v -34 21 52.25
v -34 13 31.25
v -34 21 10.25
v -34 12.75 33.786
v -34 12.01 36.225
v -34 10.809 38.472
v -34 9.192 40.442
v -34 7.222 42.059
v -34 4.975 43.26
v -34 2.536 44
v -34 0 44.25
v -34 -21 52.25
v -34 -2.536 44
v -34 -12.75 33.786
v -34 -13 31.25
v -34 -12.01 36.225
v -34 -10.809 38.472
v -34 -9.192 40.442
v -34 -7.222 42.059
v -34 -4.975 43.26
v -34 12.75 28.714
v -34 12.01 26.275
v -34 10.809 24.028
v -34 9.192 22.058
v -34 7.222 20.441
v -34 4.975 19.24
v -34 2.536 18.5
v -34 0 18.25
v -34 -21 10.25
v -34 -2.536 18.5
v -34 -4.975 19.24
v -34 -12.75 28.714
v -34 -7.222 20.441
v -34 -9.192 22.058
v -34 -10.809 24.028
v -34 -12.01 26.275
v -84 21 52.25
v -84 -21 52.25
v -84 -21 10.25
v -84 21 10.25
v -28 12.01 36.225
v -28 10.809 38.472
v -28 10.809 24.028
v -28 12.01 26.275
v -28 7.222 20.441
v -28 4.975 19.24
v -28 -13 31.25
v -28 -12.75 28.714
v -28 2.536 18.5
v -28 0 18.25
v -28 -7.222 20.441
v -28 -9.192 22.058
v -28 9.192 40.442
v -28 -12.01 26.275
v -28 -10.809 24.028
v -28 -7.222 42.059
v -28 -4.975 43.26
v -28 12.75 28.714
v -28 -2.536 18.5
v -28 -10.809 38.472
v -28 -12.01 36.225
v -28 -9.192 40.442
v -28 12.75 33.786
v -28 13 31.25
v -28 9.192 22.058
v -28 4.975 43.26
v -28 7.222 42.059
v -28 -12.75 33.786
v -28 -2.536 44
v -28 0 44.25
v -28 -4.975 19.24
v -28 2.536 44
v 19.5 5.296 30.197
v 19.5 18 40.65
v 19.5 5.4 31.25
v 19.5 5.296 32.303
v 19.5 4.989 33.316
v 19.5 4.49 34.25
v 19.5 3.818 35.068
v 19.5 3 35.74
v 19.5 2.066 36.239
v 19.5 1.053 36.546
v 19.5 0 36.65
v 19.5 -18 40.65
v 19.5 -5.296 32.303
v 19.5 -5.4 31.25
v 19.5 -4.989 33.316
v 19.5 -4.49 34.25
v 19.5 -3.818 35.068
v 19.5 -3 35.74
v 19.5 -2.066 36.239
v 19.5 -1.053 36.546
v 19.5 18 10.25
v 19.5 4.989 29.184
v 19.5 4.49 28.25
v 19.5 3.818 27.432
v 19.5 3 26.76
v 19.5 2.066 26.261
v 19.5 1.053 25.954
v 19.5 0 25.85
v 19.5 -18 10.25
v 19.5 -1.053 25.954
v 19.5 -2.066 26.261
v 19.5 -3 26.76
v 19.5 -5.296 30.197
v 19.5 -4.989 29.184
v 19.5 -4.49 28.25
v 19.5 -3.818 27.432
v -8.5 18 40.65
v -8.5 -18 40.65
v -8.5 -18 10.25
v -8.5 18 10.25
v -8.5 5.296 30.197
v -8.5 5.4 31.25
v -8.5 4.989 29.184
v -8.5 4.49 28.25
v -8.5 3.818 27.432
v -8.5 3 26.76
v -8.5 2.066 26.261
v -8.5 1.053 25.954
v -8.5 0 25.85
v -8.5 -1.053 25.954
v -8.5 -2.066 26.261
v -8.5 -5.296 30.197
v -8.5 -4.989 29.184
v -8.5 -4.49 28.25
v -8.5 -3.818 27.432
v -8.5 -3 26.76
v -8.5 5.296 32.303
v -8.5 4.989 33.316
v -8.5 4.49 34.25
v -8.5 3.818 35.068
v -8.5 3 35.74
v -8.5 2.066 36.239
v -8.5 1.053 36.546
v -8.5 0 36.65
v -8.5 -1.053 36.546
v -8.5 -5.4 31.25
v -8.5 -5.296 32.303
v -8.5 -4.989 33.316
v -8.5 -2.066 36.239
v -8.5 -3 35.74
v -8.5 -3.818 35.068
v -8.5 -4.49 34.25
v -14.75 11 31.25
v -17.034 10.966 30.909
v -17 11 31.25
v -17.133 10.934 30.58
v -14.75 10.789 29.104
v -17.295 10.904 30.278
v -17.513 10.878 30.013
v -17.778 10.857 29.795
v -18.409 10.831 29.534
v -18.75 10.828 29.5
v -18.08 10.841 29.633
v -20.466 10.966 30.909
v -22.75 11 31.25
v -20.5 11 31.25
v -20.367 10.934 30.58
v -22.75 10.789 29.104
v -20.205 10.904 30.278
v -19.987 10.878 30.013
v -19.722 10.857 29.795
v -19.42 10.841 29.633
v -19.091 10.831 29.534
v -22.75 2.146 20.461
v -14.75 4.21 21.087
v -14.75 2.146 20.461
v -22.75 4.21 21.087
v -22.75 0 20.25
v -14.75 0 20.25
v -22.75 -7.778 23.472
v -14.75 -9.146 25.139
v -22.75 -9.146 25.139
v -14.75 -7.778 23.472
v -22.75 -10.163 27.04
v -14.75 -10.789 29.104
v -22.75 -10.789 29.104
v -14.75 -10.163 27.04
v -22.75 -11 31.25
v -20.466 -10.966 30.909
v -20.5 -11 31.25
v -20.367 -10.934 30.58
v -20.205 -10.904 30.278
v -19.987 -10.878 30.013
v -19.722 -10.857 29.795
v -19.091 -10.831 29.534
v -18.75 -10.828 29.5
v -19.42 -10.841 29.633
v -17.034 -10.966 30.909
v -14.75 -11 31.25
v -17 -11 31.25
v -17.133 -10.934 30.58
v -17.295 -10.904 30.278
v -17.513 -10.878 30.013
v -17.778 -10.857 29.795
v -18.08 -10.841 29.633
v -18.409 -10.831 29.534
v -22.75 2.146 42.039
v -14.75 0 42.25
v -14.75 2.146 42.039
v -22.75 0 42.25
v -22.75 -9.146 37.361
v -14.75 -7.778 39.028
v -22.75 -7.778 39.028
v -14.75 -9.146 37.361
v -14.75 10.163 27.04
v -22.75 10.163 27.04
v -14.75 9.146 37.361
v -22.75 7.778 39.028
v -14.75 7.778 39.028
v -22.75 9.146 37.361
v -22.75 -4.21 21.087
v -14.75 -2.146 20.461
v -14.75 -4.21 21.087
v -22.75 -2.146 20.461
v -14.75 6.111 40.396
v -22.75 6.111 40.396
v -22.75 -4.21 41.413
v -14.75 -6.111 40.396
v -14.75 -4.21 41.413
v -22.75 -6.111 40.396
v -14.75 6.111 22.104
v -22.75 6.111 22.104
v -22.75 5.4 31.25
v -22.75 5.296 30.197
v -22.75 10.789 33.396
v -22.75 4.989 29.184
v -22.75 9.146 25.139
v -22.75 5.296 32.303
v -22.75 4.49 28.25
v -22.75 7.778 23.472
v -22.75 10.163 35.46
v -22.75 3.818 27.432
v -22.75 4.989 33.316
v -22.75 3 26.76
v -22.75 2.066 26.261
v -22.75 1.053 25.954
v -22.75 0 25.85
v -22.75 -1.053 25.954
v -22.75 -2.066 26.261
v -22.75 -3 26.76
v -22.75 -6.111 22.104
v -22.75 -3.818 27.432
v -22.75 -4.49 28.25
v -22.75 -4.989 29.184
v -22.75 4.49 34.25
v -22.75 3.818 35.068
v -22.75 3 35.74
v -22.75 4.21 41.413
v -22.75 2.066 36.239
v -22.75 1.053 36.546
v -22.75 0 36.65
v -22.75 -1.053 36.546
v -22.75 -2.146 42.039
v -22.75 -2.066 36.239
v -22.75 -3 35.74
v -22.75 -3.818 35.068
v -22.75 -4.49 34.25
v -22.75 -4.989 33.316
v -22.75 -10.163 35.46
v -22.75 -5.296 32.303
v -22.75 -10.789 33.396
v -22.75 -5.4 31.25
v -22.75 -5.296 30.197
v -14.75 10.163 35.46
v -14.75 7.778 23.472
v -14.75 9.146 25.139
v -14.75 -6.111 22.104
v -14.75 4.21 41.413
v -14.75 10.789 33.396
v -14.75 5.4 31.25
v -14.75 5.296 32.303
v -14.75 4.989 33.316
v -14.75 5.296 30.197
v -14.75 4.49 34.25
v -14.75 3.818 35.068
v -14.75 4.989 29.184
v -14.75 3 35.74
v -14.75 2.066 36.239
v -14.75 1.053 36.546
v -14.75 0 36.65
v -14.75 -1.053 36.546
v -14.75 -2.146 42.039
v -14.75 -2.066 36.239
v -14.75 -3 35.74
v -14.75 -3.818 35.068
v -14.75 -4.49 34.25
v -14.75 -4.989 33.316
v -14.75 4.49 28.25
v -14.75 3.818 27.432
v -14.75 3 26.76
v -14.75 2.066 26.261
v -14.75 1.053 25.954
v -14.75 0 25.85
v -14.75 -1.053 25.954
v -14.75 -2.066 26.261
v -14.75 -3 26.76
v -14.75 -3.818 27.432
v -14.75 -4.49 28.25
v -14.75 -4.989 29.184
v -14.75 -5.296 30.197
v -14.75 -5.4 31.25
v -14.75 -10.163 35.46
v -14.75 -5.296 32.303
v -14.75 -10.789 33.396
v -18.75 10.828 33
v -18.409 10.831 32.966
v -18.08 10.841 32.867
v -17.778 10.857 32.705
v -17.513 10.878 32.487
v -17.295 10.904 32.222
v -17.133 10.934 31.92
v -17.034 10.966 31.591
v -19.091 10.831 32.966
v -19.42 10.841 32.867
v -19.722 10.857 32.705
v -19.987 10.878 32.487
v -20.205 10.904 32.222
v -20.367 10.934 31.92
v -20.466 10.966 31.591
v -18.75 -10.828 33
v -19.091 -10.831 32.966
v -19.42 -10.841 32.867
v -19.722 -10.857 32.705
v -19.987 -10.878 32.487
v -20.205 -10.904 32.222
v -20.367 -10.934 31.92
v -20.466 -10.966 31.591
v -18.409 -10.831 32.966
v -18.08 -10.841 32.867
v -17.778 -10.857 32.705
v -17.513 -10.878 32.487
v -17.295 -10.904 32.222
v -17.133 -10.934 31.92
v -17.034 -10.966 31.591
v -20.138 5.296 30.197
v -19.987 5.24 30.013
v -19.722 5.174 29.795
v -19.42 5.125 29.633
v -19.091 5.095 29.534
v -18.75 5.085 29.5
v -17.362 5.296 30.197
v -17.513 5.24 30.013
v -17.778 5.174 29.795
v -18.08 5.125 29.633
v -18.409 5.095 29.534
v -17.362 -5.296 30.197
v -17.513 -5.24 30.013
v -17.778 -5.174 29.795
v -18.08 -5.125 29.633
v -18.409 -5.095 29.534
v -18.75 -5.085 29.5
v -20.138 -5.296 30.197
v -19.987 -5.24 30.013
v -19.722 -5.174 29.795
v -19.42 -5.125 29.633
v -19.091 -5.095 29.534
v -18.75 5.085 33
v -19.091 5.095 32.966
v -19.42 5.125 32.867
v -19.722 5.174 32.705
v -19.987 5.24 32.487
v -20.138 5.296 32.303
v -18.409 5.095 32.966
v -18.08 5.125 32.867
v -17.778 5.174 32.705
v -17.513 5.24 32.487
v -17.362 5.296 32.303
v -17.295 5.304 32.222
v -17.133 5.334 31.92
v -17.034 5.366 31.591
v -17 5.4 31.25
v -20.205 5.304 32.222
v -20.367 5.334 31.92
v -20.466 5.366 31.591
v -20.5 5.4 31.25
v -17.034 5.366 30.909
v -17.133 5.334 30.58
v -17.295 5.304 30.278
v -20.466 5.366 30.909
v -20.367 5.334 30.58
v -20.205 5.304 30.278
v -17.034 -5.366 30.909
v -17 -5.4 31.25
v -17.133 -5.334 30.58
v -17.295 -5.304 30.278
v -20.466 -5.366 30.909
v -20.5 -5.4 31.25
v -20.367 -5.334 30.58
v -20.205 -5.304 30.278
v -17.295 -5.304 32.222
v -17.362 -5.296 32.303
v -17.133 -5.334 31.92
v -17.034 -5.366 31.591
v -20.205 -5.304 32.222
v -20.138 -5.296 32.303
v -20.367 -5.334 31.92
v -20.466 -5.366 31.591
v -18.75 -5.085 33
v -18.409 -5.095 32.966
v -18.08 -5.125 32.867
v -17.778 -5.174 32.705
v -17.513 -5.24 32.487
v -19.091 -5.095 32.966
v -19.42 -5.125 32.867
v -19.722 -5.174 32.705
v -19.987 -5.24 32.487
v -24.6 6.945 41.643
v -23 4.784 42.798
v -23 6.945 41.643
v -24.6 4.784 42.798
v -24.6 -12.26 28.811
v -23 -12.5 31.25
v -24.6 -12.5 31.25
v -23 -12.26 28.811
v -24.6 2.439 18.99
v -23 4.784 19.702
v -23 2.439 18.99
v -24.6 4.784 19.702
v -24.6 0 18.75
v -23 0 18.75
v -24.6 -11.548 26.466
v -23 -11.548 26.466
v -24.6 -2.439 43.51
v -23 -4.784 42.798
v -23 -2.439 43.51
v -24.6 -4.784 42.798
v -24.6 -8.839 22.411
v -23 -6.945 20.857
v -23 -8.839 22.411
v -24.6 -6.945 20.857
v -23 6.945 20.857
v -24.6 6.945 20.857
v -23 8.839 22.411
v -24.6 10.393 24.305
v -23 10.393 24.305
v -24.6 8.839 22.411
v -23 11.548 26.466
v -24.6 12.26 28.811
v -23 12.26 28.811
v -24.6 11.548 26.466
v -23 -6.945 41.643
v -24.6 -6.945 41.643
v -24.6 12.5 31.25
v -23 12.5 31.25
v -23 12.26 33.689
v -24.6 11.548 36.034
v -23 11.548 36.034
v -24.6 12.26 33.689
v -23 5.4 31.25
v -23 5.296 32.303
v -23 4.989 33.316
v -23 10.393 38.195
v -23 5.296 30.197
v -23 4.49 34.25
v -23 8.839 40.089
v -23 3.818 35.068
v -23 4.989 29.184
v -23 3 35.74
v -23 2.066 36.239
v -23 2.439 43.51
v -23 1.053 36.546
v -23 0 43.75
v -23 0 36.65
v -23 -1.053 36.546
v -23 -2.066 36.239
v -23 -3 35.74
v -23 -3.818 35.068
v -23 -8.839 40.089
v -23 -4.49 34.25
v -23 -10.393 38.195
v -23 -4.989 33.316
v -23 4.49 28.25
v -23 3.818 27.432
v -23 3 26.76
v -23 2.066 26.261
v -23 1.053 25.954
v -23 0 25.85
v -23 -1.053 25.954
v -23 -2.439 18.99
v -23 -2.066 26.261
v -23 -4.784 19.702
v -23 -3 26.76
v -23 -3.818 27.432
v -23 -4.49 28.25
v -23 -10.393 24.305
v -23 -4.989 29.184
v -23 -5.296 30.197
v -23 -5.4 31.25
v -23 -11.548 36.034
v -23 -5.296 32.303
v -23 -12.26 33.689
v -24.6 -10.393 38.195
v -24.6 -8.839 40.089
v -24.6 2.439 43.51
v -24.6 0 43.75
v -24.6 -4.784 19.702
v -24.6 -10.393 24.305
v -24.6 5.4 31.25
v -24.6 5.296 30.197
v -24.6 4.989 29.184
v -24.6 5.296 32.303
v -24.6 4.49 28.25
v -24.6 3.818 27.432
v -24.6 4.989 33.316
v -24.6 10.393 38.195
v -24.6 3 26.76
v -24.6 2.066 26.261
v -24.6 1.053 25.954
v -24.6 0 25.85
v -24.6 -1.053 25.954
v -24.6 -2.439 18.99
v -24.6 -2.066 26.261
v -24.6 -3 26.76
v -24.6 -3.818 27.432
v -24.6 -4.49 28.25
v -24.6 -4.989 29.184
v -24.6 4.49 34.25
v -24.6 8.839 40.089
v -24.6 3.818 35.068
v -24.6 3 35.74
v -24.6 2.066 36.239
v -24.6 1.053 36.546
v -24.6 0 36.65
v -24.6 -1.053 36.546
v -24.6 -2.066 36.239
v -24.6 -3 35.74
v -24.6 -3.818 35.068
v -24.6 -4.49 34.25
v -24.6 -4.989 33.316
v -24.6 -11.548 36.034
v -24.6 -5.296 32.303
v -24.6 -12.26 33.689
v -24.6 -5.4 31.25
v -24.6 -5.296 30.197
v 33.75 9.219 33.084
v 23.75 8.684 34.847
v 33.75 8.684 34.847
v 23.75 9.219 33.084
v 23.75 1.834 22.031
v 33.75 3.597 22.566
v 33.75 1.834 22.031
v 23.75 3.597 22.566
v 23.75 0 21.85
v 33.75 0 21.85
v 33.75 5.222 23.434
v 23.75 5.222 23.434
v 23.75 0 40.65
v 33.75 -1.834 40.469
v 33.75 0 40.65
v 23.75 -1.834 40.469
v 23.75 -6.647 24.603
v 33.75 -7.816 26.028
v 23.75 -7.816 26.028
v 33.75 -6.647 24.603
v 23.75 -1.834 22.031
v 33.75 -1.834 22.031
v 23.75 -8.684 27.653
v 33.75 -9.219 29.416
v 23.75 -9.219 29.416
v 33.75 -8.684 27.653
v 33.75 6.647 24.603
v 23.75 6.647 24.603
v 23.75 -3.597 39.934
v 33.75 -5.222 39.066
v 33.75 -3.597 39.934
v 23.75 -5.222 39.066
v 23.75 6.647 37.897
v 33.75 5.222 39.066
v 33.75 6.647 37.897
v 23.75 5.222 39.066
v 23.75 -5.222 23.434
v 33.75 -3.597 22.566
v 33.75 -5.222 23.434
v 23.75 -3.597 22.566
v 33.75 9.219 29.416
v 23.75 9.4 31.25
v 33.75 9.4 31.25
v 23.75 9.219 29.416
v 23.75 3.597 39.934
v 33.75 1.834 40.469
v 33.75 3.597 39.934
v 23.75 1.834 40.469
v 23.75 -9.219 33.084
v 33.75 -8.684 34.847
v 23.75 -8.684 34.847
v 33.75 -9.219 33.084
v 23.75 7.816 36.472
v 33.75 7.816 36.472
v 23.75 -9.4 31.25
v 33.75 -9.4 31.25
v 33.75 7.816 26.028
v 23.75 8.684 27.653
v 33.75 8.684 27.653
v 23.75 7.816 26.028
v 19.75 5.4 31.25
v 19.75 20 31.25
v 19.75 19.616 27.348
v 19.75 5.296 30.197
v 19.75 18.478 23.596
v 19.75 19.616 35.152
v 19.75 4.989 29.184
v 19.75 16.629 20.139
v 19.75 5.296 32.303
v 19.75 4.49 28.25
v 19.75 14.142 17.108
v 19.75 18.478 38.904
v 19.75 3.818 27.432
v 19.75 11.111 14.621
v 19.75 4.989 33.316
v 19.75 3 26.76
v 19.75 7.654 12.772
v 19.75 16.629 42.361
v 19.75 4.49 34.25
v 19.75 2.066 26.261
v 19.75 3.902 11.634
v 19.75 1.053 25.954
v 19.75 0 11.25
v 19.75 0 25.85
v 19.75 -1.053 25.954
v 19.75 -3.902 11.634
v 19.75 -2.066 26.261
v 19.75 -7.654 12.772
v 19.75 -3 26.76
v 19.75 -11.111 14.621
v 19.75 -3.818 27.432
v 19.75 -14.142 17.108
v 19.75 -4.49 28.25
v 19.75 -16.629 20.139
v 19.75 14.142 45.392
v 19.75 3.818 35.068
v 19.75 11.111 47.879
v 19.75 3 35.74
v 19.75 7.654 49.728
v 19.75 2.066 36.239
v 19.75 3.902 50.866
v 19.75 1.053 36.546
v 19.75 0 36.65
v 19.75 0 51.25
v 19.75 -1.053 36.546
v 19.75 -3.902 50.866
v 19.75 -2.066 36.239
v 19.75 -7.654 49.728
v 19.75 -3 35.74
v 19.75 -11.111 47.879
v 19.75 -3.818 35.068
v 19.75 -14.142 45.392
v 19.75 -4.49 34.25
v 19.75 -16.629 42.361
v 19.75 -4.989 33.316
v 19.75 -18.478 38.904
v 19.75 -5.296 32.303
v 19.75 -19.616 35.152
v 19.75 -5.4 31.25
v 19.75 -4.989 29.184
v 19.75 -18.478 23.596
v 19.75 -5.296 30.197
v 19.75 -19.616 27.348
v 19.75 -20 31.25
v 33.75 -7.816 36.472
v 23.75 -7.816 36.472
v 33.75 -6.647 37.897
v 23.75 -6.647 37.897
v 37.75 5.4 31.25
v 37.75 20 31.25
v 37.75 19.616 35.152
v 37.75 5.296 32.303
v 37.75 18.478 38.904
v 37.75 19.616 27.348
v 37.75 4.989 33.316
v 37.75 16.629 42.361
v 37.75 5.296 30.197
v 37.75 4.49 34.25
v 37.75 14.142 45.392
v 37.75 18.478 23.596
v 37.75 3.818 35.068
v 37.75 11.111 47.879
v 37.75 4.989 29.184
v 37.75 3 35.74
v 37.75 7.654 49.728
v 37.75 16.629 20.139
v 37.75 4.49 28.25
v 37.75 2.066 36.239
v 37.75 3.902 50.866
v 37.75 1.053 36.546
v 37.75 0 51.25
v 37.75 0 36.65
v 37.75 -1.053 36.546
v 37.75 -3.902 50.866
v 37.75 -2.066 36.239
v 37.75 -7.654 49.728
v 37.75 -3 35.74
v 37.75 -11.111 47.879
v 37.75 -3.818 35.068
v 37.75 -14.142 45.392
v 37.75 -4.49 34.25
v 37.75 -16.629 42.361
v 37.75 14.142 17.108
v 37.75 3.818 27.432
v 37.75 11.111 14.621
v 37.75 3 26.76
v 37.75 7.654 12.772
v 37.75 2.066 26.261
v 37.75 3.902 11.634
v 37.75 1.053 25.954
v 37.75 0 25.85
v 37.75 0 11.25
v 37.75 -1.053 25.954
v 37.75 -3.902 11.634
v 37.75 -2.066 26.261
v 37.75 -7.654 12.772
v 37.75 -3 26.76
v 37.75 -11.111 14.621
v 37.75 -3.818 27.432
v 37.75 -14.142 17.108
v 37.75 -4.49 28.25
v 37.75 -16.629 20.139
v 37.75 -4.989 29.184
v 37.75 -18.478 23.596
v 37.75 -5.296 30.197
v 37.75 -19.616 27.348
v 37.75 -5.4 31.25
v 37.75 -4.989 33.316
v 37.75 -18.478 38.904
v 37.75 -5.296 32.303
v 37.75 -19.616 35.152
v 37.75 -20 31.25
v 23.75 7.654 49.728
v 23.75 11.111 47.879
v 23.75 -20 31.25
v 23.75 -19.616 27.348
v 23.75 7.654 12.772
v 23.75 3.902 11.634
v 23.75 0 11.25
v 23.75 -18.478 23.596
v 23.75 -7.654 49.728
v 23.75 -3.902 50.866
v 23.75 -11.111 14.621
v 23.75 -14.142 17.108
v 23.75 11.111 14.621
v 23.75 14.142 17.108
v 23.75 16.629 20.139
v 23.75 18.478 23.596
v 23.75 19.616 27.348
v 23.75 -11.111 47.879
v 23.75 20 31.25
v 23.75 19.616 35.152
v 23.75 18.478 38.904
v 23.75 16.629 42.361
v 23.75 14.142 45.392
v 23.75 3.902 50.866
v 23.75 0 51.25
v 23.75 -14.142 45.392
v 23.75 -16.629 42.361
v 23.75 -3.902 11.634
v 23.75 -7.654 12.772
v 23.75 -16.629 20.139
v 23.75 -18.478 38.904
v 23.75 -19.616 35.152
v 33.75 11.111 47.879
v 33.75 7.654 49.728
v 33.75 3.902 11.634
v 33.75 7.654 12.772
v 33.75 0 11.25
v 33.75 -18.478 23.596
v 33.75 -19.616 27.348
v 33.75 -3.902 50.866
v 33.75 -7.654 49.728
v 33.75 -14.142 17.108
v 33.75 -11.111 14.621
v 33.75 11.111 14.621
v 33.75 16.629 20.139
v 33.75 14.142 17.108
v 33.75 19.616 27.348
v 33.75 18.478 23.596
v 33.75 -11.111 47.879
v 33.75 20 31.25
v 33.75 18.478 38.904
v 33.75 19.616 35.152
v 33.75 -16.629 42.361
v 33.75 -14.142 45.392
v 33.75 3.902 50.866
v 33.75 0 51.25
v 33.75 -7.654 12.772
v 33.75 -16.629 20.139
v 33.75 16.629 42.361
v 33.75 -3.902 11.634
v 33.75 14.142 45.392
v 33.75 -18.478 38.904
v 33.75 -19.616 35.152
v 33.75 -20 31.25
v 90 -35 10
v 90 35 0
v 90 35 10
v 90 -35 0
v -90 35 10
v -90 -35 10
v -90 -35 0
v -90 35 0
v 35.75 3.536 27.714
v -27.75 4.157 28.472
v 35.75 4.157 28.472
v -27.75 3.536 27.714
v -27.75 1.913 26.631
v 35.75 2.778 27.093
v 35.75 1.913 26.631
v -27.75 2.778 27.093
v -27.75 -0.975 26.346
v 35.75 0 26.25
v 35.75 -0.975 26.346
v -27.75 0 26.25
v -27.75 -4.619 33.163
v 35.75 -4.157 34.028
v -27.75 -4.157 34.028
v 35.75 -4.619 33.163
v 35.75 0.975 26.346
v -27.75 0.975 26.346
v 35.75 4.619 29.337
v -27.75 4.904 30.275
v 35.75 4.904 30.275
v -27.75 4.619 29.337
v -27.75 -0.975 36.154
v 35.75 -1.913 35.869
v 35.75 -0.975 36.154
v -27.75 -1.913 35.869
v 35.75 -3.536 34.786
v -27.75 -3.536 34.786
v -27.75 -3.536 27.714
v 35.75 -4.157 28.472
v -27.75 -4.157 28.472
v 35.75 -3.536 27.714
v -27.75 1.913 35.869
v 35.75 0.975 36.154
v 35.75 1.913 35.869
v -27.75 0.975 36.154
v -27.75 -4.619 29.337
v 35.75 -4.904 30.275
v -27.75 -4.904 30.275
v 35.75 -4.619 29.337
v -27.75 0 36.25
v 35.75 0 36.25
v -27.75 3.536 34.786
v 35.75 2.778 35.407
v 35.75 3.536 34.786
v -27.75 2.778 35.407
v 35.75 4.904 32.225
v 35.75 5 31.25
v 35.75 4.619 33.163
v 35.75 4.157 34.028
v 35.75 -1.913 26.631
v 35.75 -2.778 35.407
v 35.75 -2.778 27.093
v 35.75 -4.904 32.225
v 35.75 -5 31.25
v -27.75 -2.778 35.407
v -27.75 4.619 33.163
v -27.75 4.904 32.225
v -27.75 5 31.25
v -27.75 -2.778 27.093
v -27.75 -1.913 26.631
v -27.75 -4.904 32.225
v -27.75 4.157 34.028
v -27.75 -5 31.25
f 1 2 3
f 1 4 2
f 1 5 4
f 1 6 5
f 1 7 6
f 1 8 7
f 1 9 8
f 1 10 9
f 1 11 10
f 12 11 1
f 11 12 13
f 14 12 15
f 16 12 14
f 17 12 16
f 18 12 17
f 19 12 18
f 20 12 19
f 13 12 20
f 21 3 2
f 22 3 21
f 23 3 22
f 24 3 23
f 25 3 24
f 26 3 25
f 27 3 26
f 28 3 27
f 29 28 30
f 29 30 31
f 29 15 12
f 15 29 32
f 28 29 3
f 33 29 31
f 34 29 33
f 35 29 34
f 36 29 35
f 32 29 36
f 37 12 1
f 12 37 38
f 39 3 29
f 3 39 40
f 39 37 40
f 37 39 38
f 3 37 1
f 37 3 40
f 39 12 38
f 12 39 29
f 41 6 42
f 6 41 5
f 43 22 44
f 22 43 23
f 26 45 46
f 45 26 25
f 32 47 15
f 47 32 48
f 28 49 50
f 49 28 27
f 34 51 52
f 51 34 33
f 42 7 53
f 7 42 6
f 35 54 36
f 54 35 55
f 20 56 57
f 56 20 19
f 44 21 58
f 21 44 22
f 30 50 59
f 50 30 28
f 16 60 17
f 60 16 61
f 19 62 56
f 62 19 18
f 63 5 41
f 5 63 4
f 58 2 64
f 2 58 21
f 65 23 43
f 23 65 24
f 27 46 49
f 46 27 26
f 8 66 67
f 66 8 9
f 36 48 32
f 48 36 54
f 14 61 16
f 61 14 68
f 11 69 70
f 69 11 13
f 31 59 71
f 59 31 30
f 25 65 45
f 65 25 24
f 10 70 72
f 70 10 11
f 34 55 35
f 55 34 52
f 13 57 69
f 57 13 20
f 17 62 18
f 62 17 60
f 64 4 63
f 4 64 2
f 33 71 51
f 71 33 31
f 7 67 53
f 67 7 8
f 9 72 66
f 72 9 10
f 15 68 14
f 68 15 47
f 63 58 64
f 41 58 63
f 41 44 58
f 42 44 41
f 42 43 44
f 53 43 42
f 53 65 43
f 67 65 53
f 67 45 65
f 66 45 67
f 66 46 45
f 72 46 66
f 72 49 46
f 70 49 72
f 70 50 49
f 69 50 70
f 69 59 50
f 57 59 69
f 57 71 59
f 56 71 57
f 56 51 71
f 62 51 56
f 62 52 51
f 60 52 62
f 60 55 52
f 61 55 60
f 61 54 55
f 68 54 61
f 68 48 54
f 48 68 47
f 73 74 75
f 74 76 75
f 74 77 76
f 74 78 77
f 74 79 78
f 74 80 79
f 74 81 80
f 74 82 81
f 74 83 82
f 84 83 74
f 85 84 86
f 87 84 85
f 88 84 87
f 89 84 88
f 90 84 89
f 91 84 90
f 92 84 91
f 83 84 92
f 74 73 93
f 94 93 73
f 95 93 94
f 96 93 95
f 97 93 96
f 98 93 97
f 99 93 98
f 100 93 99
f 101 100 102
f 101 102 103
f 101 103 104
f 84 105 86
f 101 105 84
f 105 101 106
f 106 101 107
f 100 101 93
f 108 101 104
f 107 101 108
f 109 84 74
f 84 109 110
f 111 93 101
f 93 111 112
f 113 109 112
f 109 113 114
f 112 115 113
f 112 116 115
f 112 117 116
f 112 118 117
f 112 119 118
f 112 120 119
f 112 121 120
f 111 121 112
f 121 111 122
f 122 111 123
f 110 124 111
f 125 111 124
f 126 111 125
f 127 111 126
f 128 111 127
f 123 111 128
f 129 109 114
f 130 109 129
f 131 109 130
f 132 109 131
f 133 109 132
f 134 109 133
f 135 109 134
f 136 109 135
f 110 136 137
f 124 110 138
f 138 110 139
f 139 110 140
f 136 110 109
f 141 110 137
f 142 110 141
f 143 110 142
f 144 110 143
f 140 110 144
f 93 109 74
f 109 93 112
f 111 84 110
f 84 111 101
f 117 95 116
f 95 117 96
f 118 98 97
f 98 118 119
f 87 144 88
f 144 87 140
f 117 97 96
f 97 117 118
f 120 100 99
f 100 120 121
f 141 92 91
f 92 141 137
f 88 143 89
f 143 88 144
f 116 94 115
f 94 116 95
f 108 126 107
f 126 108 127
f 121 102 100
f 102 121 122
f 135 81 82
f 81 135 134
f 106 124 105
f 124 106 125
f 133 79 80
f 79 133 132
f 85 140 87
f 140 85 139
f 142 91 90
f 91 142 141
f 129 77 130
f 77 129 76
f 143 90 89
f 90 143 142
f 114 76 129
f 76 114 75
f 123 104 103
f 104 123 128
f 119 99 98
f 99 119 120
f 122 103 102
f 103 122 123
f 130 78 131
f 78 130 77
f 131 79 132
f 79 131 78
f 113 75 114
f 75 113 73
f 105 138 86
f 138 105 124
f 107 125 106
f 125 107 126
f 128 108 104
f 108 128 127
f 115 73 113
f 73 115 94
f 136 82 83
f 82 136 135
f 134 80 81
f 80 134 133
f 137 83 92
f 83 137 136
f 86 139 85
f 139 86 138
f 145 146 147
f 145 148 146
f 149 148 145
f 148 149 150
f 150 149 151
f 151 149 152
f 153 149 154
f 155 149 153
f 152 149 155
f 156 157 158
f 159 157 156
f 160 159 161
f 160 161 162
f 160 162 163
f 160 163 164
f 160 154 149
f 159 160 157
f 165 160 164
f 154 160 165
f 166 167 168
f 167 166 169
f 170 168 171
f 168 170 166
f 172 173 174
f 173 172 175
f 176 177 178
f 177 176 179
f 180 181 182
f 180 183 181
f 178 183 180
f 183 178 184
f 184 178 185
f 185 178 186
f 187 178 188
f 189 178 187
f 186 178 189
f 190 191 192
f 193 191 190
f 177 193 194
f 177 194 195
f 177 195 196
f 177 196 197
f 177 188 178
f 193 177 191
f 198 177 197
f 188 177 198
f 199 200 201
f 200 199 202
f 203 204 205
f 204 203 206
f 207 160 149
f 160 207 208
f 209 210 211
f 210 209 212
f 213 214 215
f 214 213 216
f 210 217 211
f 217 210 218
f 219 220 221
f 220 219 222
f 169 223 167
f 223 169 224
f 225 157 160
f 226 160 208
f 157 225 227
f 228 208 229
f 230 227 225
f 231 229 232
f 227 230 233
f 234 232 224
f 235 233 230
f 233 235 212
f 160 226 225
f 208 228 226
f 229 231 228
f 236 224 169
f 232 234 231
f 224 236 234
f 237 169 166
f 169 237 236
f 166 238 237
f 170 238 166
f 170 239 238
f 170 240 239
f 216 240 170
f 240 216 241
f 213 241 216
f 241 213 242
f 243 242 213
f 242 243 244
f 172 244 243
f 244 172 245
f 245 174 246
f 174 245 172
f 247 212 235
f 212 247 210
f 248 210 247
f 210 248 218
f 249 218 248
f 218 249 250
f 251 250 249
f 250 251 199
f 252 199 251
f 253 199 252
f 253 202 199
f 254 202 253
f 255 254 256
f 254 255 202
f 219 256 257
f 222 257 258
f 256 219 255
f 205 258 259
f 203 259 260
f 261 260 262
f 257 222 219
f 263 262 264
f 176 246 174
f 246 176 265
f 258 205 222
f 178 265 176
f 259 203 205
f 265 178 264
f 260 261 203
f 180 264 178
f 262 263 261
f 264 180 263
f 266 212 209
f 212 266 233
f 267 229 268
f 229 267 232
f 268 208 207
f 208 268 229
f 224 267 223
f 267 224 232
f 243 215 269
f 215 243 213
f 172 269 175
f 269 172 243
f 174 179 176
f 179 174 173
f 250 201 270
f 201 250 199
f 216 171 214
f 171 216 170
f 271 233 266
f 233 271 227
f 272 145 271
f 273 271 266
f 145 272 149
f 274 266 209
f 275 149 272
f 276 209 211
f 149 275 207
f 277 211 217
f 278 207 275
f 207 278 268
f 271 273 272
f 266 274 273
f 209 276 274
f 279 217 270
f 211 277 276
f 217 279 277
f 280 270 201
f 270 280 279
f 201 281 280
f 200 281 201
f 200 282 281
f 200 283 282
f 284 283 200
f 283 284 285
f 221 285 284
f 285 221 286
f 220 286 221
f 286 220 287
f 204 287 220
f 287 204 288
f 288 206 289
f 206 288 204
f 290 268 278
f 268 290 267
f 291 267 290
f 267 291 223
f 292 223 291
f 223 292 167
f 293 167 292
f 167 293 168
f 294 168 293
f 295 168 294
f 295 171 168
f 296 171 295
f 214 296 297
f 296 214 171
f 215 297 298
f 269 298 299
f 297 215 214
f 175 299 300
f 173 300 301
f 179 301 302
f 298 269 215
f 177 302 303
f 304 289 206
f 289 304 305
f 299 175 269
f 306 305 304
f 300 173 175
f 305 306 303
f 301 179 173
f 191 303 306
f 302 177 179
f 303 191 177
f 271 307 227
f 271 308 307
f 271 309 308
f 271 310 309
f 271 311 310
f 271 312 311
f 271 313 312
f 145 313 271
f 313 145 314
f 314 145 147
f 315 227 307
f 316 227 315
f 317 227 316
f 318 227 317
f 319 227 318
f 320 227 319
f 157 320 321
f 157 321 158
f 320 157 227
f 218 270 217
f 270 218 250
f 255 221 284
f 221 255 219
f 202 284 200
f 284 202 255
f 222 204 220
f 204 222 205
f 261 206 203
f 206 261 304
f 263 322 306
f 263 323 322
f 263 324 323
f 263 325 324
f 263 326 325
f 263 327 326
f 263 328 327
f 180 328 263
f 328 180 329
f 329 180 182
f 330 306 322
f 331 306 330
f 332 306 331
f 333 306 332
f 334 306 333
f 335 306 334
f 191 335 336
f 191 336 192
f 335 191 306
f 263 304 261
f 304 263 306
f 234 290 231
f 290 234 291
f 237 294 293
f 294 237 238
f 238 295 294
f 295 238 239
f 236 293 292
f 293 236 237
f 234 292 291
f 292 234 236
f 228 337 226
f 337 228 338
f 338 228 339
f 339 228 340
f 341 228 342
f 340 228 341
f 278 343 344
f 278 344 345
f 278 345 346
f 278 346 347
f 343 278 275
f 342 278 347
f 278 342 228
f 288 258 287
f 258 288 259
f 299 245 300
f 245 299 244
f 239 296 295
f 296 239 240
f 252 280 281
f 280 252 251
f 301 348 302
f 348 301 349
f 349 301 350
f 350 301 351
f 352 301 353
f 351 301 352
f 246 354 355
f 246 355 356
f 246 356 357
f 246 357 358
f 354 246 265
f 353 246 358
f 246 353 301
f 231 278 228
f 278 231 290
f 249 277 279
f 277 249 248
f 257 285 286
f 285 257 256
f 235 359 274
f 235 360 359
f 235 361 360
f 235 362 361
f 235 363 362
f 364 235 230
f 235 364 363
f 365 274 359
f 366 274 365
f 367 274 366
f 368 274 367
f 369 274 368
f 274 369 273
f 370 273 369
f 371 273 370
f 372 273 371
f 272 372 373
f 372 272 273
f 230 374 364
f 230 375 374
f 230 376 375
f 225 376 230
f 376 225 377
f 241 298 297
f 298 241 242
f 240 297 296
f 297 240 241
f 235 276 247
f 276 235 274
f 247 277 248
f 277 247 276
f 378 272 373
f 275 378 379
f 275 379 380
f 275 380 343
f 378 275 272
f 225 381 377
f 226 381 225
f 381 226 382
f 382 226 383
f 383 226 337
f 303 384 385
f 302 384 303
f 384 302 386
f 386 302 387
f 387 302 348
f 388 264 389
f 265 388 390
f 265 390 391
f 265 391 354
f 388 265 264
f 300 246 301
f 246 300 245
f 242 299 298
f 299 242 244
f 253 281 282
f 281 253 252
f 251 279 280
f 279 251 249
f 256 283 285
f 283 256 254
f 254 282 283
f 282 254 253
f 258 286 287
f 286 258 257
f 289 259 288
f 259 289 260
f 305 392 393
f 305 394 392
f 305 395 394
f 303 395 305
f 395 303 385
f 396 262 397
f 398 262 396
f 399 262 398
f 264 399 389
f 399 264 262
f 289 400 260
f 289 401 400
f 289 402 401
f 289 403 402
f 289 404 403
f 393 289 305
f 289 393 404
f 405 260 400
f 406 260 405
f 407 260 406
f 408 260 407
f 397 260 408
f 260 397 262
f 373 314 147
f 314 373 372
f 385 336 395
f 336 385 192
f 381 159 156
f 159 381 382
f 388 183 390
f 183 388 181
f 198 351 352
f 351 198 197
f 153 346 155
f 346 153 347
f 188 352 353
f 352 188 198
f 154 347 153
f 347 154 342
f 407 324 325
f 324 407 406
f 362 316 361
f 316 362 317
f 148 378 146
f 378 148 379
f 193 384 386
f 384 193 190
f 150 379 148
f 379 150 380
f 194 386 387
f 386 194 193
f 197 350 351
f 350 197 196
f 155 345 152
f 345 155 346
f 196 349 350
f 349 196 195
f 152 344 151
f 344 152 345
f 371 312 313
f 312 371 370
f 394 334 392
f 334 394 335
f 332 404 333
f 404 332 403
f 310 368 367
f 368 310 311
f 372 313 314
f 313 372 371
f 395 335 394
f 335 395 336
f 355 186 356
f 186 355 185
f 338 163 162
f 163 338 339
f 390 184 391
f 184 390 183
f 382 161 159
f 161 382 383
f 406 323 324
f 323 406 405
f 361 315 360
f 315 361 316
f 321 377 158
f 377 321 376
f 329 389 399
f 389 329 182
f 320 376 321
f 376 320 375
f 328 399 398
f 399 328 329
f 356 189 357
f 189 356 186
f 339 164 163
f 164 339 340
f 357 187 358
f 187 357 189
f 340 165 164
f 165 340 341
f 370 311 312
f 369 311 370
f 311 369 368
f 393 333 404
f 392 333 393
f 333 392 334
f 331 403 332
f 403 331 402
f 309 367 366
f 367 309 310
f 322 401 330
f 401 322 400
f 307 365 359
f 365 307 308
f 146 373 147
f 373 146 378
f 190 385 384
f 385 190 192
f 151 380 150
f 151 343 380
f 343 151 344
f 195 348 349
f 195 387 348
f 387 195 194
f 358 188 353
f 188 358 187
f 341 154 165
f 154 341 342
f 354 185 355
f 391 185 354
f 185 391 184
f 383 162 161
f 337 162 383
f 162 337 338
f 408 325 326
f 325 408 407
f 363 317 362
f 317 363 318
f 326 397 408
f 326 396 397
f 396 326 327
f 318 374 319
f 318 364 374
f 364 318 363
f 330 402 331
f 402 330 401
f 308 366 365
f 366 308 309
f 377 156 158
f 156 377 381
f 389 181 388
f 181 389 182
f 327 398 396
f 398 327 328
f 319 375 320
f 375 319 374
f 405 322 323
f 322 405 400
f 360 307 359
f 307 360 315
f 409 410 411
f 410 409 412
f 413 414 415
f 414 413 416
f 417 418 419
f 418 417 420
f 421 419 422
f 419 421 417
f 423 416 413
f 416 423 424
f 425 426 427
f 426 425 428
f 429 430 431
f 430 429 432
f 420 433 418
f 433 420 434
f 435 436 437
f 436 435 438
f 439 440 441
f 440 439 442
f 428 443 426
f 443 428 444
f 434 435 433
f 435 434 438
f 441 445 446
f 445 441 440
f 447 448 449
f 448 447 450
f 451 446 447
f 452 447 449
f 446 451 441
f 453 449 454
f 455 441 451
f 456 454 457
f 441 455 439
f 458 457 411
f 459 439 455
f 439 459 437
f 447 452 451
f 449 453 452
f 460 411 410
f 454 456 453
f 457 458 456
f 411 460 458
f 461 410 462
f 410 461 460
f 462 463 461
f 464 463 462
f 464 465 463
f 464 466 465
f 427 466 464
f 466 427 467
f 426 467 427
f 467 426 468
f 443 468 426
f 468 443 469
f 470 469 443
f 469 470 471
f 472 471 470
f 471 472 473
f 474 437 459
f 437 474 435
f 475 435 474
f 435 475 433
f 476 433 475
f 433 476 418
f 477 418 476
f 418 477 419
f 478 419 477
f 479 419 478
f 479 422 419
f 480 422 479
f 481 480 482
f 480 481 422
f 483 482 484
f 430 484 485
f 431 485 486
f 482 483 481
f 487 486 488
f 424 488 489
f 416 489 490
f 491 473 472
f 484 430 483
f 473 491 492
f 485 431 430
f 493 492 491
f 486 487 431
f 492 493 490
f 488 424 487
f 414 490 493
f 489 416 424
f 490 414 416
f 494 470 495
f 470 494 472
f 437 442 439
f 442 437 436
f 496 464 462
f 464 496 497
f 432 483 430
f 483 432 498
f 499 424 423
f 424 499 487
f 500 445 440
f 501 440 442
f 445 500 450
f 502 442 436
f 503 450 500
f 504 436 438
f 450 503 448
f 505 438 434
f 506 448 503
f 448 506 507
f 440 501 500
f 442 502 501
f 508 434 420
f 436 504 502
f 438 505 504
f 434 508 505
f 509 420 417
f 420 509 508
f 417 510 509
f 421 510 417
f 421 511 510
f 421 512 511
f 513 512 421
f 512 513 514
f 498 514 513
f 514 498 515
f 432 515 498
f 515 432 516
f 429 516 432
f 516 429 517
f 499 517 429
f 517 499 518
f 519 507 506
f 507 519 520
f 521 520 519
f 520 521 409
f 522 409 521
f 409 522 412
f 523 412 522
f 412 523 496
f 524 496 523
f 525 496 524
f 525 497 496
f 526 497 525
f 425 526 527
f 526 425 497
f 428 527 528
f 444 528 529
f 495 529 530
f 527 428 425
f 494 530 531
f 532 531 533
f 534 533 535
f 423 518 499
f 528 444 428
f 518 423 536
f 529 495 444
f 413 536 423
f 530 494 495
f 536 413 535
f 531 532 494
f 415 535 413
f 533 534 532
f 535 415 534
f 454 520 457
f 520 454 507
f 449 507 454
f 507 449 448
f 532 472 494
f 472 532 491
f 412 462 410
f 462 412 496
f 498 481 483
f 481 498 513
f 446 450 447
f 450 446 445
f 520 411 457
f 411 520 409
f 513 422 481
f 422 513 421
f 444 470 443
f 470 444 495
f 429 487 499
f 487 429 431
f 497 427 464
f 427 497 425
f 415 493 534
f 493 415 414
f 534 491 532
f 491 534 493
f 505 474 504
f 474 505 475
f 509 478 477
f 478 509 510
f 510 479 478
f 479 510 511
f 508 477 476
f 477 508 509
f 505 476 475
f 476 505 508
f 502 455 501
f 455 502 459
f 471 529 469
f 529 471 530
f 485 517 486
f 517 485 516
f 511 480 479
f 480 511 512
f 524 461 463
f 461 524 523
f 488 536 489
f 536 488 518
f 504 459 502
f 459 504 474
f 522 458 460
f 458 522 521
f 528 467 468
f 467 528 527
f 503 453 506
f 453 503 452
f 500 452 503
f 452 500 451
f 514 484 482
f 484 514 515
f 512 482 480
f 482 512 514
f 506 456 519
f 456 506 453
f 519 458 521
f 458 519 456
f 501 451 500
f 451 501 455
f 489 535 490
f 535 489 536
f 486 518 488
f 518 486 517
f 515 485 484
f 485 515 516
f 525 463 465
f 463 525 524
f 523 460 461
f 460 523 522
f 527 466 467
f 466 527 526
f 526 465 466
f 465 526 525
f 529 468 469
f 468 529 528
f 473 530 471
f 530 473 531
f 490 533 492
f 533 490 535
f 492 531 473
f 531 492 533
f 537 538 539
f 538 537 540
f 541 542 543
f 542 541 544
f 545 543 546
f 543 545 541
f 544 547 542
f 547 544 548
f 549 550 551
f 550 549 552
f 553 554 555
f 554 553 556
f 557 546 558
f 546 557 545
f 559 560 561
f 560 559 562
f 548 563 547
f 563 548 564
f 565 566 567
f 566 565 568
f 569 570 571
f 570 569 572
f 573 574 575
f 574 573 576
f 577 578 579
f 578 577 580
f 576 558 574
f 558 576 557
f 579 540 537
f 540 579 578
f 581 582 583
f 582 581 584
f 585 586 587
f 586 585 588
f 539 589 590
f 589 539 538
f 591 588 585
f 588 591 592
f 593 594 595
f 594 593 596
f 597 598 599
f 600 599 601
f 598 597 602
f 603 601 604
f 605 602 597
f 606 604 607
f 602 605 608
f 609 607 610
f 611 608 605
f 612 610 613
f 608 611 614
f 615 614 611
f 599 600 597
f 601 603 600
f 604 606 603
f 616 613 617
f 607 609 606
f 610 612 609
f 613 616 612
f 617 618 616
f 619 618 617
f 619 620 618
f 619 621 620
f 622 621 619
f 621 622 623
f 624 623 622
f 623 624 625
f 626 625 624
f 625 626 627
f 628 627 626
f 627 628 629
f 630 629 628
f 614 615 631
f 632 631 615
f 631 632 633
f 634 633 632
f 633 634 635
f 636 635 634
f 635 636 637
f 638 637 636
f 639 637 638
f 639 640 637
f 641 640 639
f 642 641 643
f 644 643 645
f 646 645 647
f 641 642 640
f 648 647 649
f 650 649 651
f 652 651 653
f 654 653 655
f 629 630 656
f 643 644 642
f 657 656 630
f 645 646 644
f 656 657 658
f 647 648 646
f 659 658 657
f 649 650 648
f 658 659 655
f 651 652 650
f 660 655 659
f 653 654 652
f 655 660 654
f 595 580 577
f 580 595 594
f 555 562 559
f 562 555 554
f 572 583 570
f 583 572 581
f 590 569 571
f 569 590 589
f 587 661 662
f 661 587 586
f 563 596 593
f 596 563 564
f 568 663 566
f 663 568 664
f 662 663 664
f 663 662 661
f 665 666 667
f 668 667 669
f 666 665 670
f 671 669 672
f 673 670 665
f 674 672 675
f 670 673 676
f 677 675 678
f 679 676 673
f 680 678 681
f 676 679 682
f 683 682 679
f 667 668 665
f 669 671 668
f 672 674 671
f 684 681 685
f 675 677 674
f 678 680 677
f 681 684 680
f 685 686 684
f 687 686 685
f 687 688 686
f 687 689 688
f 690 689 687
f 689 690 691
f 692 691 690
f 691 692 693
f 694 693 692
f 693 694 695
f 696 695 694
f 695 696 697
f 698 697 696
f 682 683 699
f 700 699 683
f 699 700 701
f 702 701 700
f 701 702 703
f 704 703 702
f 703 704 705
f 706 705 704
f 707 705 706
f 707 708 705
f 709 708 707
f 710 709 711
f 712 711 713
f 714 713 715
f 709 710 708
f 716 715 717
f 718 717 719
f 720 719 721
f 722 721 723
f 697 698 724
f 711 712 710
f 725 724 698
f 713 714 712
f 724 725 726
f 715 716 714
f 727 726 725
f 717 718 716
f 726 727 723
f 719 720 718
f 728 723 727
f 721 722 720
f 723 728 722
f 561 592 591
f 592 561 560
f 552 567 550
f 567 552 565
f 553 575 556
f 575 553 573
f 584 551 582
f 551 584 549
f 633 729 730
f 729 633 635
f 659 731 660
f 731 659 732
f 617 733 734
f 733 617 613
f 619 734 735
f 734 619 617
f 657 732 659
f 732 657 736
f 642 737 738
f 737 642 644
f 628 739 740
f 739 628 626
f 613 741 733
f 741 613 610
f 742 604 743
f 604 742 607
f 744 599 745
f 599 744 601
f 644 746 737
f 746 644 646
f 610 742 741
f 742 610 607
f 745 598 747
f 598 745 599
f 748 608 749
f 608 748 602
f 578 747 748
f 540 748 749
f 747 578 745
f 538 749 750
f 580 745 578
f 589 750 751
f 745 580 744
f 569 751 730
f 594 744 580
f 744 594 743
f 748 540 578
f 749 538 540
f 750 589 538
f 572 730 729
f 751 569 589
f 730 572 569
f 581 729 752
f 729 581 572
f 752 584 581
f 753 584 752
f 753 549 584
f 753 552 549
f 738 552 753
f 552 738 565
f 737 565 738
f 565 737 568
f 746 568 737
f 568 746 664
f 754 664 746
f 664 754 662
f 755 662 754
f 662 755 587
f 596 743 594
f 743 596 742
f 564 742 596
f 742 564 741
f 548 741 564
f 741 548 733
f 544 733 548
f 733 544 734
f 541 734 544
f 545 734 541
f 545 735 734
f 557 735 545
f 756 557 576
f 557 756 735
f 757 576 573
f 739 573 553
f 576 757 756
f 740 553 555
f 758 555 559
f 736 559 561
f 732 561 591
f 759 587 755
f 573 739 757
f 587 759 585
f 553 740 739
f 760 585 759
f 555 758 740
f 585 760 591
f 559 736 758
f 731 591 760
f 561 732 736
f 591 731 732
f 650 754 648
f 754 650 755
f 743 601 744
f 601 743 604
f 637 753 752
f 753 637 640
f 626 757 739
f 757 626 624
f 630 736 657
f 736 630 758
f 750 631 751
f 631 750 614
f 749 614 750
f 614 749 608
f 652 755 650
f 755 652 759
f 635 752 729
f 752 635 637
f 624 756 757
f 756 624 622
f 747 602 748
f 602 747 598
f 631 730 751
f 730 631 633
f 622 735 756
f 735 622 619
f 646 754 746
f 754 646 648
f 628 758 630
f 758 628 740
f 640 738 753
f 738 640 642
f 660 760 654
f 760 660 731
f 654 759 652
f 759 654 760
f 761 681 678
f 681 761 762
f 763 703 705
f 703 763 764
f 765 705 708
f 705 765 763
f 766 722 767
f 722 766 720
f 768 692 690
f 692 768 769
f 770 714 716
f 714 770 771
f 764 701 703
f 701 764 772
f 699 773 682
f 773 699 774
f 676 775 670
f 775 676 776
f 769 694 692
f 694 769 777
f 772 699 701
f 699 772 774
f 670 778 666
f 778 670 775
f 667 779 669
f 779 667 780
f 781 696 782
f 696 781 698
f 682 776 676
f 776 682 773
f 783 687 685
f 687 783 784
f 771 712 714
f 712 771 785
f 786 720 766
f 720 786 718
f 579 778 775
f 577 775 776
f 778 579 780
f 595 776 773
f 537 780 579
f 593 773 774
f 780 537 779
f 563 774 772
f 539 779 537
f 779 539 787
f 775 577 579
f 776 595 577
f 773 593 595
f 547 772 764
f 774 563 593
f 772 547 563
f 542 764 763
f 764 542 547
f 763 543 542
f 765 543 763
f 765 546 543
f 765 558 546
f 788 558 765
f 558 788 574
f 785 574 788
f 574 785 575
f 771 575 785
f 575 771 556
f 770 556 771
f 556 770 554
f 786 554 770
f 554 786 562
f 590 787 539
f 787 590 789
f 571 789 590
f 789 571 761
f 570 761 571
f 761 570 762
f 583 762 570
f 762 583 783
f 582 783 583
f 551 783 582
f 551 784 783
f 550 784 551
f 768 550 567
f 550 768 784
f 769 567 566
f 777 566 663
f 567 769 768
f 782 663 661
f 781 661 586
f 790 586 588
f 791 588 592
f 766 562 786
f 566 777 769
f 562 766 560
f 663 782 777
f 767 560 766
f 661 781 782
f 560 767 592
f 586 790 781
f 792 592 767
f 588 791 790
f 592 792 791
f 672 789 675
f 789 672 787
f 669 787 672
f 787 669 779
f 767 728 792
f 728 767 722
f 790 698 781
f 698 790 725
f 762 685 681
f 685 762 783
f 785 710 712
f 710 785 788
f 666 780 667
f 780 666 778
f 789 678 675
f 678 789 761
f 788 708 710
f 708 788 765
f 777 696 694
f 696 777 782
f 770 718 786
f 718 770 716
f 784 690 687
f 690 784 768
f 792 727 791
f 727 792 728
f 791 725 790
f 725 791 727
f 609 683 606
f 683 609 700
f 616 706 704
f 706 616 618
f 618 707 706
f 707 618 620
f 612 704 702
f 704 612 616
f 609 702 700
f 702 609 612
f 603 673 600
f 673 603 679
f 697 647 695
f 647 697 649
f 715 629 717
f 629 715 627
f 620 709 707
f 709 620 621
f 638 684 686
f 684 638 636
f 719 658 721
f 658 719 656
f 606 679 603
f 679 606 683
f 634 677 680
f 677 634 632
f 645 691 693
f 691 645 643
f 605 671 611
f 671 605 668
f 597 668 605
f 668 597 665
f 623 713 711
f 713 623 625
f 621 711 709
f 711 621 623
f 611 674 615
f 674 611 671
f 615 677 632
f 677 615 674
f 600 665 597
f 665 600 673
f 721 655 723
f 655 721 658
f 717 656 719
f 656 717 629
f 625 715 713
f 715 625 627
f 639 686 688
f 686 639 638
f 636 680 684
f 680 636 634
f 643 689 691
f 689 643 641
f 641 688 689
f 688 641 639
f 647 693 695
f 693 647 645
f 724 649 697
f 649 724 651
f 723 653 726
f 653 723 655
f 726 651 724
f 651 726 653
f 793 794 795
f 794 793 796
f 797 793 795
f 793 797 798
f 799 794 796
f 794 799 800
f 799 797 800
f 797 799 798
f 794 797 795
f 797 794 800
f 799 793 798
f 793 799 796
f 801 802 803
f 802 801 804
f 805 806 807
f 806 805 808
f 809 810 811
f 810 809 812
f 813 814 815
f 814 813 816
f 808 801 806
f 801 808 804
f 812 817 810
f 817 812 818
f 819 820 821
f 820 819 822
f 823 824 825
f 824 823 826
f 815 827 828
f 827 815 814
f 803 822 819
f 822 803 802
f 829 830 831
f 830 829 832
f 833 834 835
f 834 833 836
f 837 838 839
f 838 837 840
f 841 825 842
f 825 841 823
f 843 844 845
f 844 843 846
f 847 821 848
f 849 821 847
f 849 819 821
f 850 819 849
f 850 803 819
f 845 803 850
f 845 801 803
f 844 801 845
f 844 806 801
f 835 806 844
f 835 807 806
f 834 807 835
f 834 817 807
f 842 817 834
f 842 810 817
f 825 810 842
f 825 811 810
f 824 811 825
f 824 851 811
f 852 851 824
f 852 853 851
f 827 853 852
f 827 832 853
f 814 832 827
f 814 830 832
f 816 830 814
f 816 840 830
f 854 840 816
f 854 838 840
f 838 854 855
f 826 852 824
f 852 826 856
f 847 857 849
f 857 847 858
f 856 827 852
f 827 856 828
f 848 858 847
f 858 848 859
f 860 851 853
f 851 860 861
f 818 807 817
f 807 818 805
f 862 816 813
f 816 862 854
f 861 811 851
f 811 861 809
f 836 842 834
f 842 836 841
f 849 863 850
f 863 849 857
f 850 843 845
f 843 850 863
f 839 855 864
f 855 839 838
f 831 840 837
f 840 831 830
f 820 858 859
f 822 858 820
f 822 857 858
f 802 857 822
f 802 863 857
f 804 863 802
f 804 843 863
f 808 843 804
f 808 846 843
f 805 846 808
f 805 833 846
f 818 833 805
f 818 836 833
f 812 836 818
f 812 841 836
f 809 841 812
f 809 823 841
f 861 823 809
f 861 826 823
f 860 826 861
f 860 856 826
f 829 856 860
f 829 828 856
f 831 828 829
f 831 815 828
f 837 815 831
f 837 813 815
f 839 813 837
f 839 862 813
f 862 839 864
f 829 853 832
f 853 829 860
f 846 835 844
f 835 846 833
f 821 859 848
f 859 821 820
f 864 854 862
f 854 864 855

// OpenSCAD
$fn = 32;

// ------------------------------------------------------------------------
// Motor drive station: motor 50 x 42 mm, shaft d10, pulley d40
// Every part is its own module, assembly() places every instance.
// ------------------------------------------------------------------------

// --- part 1 ---
module station_bed() {
  difference() {
    translate([-90, -35, 0]) cube([180, 70, 10]);
  }
}

// --- part 2 ---
module drive_motor() {
  union() {
    translate([-25, -21, 0]) cube([50, 42, 42]);
    translate([28, 0, 21]) rotate([0, 90, 0]) cylinder(h = 6, d = 26, center = true);
  }
}

// --- part 3 ---
module pillow_block() {
  difference() {
    translate([-14, -18, 0]) cube([28, 36, 30.4]);
    translate([0, 0, 21]) rotate([0, 90, 0]) cylinder(h = 30, d = 10.8, center = true);
  }
}

// --- part 4 ---
module drive_shaft() {
  translate([0, 0, -31.75]) cylinder(h = 63.5, d = 10);
}

// --- part 5 ---
module shaft_collar() {
  difference() {
    cylinder(h = 8, d = 22);
    translate([0, 0, -1]) cylinder(h = 10, d = 10.8);
    translate([0, 0, 4]) rotate([90, 0, 0]) cylinder(h = 24, d = 3.5, center = true);
  }
}

// --- part 6 ---
module collar_washer() {
  difference() {
      translate([0, 0, 0]) cylinder(h = 1.6, d = 25);
      translate([0, 0, -1]) cylinder(h = 3.6, d = 10.8);
    }
}

// --- part 7 ---
module drive_pulley() {
  difference() {
    union() {
      cylinder(h = 18, d = 18.8);
      cylinder(h = 4, d = 40);
      translate([0, 0, 14]) cylinder(h = 4, d = 40);
    }
    translate([0, 0, -1]) cylinder(h = 20, d = 10.8);
  }
}

// --- assembly ---
module assembly() {
  color([0.80, 0.24, 0.20]) translate([0, 0, 0]) rotate([0, 0, 0]) station_bed();
  color([0.20, 0.45, 0.75]) translate([-59, 0, 10.25]) rotate([0, 0, 0]) drive_motor();
  color([0.25, 0.62, 0.32]) translate([5.5, 0, 10.25]) rotate([0, 0, 0]) pillow_block();
  color([0.92, 0.70, 0.18]) translate([4, 0, 31.25]) rotate([0, 90, 0]) drive_shaft();
  color([0.58, 0.35, 0.70]) translate([-22.75, 0, 31.25]) rotate([0, 90, 0]) shaft_collar();
  color([0.16, 0.66, 0.66]) translate([-24.6, 0, 31.25]) rotate([0, 90, 0]) collar_washer();
  color([0.85, 0.48, 0.18]) translate([19.75, 0, 31.25]) rotate([0, 90, 0]) drive_pulley();
}

assembly();
